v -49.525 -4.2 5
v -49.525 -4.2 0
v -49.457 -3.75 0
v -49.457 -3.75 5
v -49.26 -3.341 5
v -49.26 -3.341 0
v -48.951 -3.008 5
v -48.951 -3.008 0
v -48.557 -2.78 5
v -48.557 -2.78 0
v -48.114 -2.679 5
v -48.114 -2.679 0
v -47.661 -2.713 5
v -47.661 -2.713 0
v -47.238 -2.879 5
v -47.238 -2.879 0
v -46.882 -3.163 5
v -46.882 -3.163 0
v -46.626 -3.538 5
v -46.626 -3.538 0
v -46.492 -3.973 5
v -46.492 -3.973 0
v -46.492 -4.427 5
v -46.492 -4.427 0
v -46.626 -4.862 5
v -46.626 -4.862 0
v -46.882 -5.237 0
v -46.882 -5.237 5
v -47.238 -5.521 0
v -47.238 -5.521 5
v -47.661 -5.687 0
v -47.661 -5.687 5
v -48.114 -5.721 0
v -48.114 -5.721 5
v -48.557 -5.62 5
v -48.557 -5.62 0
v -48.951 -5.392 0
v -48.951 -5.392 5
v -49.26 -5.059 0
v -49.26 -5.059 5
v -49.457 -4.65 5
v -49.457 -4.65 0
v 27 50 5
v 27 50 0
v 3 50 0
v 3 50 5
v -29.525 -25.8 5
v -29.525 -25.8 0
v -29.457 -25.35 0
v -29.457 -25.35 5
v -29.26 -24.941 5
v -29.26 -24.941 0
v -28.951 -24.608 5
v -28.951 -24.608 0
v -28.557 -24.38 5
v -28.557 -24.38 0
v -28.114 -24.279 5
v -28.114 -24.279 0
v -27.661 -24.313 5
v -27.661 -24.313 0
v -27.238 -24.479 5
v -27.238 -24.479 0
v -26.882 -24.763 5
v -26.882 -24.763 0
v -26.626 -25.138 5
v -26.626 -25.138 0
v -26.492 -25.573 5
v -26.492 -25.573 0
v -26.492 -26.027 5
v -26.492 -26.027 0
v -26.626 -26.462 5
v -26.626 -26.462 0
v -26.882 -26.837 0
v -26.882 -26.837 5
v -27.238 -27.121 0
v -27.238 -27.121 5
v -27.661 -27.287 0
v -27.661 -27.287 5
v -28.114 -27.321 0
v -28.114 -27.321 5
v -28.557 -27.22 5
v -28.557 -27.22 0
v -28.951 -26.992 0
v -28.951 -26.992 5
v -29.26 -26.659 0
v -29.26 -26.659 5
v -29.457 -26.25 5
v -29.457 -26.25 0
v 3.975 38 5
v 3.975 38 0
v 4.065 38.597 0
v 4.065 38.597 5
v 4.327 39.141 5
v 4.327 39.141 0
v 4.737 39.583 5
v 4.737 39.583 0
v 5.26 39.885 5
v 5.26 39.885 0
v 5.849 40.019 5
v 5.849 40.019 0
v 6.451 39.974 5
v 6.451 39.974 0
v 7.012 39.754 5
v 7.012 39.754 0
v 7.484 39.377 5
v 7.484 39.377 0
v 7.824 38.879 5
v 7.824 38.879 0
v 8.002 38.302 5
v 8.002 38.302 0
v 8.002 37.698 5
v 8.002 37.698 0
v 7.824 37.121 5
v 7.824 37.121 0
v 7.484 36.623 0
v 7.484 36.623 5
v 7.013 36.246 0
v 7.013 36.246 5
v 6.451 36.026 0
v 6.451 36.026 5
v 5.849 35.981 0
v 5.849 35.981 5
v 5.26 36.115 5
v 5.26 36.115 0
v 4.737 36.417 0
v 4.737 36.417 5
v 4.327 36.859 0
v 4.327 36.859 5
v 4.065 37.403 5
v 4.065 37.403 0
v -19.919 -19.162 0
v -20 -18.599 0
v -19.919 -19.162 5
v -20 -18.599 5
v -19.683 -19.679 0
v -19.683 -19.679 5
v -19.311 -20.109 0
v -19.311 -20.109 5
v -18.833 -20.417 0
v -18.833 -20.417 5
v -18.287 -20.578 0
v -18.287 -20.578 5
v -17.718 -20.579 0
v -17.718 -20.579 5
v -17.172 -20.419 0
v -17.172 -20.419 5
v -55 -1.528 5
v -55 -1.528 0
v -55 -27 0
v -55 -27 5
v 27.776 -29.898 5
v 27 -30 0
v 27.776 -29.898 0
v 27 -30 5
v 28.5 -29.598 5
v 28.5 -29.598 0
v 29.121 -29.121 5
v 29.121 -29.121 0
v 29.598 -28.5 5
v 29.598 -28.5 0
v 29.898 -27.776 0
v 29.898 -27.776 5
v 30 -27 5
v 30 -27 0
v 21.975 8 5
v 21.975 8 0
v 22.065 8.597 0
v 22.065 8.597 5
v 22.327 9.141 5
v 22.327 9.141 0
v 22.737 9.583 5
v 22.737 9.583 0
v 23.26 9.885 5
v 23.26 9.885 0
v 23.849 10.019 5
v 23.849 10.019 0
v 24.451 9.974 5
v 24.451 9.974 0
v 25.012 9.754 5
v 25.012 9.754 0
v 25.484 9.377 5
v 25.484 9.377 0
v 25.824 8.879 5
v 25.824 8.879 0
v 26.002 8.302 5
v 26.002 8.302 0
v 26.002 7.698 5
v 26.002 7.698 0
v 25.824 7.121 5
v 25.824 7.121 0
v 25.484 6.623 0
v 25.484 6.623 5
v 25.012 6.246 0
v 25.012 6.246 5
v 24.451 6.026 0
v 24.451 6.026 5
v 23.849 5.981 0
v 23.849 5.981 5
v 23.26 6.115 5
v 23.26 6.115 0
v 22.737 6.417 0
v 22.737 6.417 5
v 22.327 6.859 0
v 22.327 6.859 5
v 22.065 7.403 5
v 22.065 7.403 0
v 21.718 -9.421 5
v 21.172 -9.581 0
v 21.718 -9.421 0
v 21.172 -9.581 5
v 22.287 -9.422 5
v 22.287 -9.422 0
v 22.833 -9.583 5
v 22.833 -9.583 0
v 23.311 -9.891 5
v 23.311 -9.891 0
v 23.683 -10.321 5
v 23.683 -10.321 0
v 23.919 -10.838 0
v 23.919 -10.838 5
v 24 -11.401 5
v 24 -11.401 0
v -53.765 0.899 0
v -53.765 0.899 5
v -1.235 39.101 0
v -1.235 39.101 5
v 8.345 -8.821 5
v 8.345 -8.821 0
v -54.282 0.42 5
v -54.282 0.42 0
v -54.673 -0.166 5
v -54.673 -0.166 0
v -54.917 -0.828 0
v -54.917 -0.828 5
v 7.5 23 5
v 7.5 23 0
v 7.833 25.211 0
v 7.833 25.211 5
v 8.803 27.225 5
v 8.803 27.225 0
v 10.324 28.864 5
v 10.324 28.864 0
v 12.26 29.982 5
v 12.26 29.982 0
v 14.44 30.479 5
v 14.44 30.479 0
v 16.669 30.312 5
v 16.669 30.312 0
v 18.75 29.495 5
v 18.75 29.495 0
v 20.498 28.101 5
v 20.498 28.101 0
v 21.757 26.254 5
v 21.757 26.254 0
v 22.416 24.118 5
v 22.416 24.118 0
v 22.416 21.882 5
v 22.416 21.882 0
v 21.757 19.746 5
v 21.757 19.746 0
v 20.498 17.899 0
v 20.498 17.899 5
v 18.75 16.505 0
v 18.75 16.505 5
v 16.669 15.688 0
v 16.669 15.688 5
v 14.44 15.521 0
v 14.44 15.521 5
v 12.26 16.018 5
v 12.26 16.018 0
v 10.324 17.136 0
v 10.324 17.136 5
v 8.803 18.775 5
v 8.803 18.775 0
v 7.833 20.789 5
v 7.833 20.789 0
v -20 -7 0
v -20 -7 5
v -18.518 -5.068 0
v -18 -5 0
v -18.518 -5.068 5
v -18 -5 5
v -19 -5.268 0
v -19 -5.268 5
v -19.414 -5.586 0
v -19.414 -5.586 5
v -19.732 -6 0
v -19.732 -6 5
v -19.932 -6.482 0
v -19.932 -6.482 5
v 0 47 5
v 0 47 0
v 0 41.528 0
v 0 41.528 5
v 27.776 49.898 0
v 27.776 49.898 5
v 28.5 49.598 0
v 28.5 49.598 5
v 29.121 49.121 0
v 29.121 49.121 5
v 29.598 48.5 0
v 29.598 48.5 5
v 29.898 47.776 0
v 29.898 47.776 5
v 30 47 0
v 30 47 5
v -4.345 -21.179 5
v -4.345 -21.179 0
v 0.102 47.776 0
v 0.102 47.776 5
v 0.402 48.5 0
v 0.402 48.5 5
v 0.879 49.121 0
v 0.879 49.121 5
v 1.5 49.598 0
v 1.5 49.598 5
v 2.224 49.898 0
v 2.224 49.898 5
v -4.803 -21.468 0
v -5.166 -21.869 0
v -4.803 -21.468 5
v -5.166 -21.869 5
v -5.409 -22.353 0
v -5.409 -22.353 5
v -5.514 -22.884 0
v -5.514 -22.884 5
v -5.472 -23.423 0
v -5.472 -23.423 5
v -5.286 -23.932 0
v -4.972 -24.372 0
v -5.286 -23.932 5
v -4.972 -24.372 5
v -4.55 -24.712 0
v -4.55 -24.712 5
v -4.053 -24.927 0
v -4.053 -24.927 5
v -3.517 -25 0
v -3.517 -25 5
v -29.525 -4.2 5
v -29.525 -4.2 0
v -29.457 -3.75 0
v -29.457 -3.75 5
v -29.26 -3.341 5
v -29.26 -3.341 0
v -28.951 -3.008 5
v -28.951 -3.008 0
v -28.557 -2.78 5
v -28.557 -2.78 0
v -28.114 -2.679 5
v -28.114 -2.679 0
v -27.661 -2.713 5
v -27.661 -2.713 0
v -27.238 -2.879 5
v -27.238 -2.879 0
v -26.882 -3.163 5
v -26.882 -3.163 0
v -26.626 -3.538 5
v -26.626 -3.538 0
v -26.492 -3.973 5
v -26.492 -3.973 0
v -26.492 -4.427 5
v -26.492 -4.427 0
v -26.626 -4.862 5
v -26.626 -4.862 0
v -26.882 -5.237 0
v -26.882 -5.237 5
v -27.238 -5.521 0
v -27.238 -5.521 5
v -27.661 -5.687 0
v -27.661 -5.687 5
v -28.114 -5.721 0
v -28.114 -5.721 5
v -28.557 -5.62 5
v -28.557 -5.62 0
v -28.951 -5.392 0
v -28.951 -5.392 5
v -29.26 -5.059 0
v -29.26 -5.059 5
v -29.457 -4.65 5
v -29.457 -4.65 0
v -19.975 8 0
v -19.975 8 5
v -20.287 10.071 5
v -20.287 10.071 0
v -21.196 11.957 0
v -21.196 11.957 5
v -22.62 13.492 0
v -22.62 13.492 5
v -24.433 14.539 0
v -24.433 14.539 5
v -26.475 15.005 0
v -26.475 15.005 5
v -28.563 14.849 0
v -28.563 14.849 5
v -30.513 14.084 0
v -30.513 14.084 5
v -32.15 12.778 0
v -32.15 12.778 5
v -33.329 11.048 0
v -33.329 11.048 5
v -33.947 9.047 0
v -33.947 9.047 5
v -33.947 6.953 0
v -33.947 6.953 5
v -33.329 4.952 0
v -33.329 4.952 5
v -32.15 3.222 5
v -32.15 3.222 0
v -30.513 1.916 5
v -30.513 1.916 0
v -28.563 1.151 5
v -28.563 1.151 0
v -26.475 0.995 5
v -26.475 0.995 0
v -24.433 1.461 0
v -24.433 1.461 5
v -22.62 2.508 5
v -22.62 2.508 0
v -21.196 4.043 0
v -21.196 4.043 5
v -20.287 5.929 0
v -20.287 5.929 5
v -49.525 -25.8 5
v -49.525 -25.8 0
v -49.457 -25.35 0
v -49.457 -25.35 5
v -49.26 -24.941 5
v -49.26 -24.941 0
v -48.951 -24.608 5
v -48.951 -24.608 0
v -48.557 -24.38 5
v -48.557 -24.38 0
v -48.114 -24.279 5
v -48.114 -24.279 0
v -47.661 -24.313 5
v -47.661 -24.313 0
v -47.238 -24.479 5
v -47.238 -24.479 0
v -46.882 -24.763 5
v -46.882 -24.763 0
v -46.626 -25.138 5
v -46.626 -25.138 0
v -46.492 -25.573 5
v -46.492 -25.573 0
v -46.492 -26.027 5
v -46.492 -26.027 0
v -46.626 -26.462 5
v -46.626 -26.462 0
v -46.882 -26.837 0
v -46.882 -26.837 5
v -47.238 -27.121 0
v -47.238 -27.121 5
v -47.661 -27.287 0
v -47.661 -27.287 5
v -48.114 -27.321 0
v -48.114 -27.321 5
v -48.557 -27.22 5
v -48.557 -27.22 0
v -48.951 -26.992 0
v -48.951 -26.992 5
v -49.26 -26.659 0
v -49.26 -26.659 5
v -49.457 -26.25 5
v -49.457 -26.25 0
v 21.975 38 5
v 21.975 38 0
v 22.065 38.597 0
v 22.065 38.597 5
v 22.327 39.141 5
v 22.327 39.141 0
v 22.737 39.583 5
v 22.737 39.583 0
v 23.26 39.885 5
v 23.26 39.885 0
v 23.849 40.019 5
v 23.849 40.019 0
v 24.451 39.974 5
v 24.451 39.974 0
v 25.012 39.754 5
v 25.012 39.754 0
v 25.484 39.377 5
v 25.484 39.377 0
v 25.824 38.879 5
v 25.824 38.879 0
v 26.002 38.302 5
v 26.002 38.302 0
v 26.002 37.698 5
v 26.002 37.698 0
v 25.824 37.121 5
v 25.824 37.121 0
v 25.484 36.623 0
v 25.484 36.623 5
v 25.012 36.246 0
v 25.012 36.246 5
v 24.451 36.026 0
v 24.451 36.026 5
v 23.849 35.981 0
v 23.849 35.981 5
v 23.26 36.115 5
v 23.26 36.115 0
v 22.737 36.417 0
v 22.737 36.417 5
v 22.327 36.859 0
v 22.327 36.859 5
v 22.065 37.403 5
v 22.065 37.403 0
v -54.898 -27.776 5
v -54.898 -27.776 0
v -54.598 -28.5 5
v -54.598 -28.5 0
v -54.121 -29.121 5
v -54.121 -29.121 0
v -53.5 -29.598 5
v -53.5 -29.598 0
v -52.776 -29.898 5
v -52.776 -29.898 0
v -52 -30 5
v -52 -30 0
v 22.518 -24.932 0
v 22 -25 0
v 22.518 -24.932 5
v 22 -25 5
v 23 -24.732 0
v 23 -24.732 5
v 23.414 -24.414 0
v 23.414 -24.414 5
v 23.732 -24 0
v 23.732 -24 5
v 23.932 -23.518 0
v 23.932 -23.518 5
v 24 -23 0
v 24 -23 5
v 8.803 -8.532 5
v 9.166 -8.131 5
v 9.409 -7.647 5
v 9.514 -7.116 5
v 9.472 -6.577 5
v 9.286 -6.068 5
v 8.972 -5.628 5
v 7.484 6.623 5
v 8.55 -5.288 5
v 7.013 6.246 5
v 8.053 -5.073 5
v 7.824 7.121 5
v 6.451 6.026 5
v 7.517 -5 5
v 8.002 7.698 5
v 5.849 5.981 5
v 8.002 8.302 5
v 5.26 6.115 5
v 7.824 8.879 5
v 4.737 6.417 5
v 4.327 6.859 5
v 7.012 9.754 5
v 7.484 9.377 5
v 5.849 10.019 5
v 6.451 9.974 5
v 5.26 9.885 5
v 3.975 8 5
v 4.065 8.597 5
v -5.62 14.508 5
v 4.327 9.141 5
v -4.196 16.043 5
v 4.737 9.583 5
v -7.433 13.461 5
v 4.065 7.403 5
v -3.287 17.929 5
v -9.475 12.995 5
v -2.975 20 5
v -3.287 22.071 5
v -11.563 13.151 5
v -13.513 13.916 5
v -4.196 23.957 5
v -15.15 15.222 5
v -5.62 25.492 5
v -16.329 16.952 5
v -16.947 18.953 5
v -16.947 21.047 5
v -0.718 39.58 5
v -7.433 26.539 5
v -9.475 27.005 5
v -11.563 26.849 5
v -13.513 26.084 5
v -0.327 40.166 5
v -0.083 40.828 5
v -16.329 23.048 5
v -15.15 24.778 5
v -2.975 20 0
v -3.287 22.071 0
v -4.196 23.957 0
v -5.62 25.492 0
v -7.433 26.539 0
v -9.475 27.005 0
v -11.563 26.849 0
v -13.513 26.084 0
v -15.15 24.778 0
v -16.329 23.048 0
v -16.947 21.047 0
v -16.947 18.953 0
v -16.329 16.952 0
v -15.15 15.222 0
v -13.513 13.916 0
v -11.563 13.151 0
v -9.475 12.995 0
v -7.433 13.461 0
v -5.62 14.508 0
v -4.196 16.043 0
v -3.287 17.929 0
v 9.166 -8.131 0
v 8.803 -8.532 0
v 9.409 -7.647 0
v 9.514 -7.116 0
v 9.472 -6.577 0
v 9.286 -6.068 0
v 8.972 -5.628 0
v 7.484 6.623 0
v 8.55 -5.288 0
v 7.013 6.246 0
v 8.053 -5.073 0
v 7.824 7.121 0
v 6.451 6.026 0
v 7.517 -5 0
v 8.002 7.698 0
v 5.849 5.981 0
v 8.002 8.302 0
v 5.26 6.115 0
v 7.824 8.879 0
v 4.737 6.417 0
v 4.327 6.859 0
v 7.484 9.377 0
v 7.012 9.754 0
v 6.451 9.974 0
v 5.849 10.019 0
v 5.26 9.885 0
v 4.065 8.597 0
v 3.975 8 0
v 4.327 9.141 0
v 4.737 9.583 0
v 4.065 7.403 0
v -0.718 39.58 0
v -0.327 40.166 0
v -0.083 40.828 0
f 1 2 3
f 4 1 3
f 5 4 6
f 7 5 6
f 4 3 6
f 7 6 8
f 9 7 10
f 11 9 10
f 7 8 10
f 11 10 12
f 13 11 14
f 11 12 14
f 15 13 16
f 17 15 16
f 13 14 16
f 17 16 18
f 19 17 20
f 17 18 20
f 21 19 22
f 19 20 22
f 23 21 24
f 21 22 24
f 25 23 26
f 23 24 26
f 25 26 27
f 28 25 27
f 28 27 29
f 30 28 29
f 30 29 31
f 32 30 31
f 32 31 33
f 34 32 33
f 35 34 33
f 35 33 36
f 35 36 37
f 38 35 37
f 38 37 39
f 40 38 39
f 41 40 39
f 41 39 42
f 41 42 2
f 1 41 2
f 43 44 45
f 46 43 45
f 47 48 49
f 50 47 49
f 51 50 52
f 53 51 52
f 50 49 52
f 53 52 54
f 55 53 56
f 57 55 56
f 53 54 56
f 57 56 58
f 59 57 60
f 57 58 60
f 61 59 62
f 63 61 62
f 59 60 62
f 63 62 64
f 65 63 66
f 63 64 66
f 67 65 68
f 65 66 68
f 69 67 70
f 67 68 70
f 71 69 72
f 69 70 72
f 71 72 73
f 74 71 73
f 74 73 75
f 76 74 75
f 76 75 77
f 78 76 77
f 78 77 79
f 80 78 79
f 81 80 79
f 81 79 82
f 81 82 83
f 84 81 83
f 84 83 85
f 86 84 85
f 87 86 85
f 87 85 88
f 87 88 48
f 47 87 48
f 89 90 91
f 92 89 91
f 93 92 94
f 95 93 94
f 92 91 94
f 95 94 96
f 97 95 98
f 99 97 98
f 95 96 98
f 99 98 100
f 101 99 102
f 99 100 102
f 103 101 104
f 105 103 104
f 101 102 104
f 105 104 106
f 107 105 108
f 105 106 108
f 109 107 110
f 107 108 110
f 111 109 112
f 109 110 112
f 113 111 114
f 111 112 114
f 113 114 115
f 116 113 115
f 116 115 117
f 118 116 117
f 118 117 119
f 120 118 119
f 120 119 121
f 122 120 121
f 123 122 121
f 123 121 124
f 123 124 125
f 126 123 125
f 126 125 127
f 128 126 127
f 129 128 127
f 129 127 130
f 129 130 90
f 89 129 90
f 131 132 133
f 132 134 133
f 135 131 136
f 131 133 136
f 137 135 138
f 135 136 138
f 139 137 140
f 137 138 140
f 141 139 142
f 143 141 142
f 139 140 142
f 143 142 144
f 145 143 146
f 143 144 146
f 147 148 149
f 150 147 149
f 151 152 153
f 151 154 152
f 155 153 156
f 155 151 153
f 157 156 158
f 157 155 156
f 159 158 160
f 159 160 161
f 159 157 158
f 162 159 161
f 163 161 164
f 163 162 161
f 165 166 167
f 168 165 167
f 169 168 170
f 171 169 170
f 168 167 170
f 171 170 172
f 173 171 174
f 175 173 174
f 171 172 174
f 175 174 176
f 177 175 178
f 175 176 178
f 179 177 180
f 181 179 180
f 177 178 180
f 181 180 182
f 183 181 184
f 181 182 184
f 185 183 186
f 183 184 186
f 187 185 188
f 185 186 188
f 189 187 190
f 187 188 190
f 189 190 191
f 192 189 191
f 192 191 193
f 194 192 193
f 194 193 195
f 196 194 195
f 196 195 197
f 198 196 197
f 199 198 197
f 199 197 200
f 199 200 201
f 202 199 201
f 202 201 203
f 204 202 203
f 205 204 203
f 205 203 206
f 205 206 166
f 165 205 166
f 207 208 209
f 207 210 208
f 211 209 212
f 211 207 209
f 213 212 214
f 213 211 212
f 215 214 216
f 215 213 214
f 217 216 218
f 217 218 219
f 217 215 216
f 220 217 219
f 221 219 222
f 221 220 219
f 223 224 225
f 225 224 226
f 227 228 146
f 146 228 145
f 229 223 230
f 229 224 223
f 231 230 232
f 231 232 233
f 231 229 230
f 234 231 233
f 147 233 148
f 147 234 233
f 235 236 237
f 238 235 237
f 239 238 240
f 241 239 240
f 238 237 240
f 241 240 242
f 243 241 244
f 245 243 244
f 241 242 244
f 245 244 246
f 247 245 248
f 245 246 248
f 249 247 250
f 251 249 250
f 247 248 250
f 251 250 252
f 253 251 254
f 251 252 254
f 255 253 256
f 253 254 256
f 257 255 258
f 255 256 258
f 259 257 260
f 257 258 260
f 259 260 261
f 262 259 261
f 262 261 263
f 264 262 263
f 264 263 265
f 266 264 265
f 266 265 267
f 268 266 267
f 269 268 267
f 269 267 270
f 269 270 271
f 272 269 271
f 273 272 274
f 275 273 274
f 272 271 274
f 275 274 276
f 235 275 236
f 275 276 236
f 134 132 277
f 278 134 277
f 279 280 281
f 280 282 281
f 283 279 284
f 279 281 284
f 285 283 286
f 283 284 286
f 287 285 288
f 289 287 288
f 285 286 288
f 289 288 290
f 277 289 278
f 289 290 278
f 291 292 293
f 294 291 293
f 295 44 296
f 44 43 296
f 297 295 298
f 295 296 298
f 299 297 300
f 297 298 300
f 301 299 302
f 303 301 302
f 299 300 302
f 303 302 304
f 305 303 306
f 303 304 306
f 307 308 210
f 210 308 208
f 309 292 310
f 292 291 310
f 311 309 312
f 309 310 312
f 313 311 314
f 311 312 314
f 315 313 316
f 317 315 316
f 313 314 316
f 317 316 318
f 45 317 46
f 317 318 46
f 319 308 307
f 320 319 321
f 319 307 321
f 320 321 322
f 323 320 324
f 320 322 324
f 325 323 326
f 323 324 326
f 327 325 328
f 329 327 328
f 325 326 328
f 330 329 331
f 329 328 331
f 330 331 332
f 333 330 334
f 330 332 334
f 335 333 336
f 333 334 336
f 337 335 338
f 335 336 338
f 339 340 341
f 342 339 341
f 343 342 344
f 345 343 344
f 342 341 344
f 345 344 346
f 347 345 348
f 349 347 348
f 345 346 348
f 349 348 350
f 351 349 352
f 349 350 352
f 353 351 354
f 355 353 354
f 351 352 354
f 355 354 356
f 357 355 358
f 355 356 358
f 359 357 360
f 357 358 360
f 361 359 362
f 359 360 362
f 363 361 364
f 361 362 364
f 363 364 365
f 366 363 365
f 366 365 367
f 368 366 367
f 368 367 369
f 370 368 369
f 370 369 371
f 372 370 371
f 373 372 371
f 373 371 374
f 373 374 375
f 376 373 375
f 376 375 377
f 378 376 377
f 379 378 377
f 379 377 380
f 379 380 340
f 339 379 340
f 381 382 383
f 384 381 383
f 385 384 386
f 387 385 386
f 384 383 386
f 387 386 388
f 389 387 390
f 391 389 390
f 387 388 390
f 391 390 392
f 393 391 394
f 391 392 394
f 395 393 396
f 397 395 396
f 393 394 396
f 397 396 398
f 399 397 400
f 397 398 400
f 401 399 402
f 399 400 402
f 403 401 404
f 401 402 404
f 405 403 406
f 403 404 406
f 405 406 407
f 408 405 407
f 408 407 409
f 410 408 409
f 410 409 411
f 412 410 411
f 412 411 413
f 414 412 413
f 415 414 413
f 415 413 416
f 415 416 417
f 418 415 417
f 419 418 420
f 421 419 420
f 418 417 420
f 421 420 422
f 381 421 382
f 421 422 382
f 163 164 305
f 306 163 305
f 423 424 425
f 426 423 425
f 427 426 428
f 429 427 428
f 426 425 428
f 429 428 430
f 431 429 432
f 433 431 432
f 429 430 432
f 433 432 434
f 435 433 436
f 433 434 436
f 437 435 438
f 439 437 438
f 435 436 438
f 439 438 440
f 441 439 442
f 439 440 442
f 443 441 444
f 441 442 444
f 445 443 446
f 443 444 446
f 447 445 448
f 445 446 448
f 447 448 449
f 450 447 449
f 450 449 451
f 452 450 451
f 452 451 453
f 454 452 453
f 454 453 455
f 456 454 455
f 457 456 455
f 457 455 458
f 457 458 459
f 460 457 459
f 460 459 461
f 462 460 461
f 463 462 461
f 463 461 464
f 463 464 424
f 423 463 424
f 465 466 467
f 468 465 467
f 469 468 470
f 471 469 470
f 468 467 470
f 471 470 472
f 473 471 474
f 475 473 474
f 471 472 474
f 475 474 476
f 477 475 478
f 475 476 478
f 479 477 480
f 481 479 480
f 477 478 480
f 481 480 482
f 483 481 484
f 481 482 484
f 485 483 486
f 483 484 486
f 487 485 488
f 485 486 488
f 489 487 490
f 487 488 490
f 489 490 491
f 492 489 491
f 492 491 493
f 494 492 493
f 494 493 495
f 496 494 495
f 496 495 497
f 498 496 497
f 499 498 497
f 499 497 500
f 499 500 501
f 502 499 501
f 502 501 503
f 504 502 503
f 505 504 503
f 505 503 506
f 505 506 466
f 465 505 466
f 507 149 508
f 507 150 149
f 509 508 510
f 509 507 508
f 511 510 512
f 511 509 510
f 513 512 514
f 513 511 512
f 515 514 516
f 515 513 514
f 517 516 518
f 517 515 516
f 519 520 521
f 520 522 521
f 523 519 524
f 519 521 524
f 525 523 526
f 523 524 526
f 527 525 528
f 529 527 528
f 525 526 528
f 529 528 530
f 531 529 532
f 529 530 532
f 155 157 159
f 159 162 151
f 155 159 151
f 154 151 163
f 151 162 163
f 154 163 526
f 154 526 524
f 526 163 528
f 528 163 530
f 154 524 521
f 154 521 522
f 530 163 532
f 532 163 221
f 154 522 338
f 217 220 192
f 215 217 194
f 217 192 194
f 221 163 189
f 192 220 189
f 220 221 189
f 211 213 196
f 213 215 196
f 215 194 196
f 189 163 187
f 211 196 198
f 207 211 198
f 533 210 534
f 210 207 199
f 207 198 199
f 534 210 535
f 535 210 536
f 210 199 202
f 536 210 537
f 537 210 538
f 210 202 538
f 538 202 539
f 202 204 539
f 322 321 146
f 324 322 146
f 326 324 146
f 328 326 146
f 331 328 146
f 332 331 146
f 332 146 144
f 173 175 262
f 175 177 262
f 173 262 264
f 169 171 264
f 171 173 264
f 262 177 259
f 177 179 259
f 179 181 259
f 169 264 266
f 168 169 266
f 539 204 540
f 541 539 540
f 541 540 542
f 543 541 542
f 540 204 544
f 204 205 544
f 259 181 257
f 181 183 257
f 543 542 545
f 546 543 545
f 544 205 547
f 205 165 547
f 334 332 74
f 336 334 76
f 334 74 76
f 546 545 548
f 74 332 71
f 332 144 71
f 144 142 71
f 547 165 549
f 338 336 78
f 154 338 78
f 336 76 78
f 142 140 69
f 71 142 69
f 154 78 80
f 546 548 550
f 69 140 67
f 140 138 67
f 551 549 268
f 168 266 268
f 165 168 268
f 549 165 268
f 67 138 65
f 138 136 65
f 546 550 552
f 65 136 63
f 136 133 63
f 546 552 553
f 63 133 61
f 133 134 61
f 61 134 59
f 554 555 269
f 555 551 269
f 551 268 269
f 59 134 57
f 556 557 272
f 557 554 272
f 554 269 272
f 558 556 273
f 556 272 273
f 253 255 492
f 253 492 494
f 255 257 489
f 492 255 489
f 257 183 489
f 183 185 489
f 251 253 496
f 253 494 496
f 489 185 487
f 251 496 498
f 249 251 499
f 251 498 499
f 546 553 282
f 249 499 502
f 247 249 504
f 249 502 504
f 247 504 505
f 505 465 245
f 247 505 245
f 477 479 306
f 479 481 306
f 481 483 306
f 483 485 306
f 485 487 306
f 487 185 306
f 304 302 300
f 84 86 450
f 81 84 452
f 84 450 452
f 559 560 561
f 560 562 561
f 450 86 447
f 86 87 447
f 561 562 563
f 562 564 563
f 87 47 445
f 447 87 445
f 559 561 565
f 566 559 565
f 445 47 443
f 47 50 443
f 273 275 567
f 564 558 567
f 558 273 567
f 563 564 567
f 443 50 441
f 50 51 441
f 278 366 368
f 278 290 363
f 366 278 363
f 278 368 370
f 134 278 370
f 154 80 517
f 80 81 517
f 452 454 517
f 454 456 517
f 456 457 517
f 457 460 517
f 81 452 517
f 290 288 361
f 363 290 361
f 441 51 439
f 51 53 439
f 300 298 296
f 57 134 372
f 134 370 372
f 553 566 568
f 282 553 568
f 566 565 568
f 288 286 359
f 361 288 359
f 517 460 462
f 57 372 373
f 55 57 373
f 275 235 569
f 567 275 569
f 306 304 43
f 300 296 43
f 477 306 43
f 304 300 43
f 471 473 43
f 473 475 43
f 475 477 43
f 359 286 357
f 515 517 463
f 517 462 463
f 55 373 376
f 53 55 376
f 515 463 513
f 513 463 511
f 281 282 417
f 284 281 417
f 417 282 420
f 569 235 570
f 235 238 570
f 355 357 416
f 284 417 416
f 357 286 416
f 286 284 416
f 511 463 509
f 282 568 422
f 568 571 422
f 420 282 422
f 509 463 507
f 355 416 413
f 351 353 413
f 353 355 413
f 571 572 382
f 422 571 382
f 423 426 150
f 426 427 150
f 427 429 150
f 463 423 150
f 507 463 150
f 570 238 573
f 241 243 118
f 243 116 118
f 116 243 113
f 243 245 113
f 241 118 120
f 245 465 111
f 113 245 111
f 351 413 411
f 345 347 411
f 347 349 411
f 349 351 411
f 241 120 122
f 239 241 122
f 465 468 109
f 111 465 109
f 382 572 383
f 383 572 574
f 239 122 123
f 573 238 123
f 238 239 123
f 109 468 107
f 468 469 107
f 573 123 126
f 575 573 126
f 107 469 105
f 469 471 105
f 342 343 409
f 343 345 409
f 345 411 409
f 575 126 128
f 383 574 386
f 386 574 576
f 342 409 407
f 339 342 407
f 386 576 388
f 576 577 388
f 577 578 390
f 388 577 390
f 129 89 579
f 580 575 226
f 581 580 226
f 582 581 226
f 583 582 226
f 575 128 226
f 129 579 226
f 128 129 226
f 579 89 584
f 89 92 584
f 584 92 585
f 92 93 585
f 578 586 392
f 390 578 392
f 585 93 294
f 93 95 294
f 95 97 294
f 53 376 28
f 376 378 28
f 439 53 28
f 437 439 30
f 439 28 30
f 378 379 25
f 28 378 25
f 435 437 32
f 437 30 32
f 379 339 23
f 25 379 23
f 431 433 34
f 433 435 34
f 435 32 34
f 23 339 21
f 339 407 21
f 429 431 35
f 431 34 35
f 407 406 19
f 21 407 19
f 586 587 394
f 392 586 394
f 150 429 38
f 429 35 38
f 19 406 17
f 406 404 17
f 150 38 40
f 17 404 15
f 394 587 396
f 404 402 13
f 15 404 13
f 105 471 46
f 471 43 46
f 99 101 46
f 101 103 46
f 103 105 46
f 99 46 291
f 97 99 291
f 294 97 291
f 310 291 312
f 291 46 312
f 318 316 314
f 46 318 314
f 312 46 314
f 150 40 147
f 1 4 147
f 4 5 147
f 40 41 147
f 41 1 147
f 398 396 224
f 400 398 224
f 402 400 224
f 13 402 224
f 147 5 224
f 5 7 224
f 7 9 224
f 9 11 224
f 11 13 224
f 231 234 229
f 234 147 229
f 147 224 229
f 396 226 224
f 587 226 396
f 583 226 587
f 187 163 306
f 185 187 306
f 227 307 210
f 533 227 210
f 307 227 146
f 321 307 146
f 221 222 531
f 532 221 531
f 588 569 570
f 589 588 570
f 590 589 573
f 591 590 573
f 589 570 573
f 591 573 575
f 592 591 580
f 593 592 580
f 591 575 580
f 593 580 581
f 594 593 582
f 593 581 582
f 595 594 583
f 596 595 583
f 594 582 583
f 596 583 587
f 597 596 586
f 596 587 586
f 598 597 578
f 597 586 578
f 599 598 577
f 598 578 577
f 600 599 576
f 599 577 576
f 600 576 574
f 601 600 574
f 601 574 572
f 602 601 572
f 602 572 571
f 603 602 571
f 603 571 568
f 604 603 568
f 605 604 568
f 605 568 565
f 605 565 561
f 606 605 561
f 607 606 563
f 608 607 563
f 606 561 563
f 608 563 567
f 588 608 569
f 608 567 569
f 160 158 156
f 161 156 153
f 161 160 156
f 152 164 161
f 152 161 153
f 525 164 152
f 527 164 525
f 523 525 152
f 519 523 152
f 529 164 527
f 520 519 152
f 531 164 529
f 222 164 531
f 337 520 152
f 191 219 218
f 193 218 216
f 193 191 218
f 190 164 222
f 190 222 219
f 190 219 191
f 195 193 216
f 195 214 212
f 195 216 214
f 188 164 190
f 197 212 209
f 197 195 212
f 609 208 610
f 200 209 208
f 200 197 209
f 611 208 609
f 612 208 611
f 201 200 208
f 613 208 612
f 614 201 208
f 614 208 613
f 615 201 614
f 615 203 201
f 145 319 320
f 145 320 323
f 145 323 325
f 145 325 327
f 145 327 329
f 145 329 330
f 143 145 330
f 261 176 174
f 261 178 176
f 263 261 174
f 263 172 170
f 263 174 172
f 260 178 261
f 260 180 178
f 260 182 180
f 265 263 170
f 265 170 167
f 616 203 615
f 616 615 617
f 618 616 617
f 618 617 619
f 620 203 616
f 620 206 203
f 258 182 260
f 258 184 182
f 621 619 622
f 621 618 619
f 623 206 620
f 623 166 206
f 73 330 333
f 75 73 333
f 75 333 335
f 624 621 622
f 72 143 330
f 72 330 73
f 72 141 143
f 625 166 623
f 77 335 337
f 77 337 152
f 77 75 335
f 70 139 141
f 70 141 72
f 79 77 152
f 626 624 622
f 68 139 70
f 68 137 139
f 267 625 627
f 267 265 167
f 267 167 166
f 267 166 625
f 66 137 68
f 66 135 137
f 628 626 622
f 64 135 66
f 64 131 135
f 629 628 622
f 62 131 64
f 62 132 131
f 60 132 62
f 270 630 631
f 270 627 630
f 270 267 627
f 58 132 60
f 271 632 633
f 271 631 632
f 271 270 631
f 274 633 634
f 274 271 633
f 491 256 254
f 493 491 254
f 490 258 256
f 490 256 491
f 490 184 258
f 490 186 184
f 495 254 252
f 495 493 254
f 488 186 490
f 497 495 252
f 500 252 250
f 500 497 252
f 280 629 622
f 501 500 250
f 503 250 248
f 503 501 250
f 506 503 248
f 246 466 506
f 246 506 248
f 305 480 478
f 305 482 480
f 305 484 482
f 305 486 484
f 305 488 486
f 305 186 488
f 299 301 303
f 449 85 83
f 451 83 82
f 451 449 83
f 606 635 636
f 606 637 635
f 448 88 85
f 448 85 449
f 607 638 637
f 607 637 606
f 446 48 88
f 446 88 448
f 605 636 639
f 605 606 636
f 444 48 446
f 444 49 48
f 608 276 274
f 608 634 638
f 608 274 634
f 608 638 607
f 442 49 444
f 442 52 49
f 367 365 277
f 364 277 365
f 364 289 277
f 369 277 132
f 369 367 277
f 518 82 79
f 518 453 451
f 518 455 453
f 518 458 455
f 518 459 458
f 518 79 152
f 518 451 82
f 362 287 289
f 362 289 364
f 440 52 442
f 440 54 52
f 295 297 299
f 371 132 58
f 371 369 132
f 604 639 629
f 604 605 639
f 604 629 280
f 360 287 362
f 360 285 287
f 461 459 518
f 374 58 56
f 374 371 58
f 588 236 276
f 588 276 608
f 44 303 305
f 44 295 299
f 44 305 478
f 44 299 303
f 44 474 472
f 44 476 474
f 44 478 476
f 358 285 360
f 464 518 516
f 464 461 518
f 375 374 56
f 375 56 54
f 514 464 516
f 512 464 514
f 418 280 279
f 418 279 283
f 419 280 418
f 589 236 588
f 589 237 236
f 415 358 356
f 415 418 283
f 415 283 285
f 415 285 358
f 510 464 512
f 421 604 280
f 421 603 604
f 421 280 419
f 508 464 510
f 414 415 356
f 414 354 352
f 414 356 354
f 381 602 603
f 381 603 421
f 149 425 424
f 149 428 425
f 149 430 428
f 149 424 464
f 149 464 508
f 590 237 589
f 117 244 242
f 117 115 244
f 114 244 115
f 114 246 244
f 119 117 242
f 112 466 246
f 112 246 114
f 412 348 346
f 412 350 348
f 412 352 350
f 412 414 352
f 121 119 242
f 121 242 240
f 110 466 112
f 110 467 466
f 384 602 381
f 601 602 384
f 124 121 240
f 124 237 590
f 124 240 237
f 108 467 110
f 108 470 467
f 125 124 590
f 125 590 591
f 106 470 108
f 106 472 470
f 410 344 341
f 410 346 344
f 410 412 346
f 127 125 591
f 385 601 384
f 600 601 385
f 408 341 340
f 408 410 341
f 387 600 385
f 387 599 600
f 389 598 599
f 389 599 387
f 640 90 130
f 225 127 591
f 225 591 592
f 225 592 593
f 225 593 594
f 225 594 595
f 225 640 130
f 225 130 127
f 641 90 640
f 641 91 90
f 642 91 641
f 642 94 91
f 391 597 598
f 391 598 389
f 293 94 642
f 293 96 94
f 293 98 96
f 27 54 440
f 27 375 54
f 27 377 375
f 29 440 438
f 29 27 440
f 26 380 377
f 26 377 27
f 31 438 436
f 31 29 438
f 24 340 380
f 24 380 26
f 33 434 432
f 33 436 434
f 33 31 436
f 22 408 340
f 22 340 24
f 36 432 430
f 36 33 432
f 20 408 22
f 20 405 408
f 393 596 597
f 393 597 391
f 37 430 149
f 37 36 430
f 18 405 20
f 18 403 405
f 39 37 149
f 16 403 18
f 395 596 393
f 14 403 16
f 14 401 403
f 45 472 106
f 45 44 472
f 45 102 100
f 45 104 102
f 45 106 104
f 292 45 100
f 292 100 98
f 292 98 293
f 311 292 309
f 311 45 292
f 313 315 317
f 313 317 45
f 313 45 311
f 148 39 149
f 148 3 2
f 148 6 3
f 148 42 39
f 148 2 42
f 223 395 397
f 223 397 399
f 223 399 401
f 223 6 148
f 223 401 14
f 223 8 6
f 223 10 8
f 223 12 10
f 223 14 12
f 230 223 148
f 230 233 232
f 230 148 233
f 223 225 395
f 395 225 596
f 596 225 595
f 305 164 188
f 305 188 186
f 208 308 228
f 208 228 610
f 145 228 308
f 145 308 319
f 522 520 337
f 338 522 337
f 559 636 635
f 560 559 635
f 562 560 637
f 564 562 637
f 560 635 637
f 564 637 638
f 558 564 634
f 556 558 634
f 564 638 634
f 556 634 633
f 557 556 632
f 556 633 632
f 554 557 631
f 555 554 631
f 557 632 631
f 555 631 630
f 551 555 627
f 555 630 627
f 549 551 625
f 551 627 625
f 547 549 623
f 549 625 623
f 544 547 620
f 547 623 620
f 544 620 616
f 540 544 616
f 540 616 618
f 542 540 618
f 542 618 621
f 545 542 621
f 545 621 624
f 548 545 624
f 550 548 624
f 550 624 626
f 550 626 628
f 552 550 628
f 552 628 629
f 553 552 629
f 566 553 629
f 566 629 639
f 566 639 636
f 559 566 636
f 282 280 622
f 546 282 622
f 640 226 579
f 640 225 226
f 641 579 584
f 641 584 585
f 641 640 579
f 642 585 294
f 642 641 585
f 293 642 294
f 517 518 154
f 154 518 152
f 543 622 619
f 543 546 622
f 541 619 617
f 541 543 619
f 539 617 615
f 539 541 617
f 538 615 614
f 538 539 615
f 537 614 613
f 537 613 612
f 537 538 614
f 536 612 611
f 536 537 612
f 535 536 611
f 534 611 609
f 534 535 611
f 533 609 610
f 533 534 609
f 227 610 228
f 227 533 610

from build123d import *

# Parameters (mm, degrees)
EXTRUDE_1_DEPTH          = 5
EXTRUDE_2_DEPTH          = 5
CUT_EXTRUDE_1_DEPTH      = 5
CUT_EXTRUDE_2_REACH      = 7
SKETCH_5_R               = 1.524999999
SKETCH_6_R               = 2.025
CUT_EXTRUDE_3_DEPTH      = 1
CUT_EXTRUDE_3_DEPTH_BACK = 6
CUT_EXTRUDE_4_DEPTH      = 6
FILLET_4_R               = 2
SKETCH_8_R               = 7.5
CUT_EXTRUDE_5_DEPTH      = 5
EXTRUDE_3_DEPTH          = 5
SKETCH_10_R              = 7.025
CUT_EXTRUDE_6_DEPTH      = 5
FILLET_5_R               = 3


with BuildPart() as part:
    # 草图1 → 凸台-拉伸1 (new body)
    with BuildSketch(Plane.XY):
        Polygon((0, 0), (-55, 0), (-55, -30), (30, -30), (30, 50), (0, 50), align=None)
    extrude(amount=EXTRUDE_1_DEPTH)

    # 草图2 → 凸台-拉伸2 (add)
    with BuildSketch(Plane.XY.offset(5)):
        Polygon((0, 40), (-45, 0), (0, 0), align=None)
    extrude(amount=-EXTRUDE_2_DEPTH)

    # 草图4 → 切除-拉伸1 (cut)
    with BuildSketch(Plane.XY.offset(5)):
        Polygon((0, 33.310225234), (0, 0), (-37.474003388, 0), align=None)
    extrude(amount=-CUT_EXTRUDE_1_DEPTH, mode=Mode.SUBTRACT)

    # 草图5 → 切除-拉伸2 (cut, up to next)
    with BuildSketch(Plane(origin=(0, 0, 0), x_dir=(-1, 0, 0), z_dir=(0, 0, -1)), mode=Mode.PRIVATE) as cut_extrude_2_sk1:
        with Locations((48, -4.2)):
            Circle(SKETCH_5_R)
    cut_extrude_2_tool1 = extrude(cut_extrude_2_sk1.sketch, amount=-CUT_EXTRUDE_2_REACH, mode=Mode.PRIVATE) & part.part
    add(cut_extrude_2_tool1.solids().sort_by_distance((-48, -4.2, 0))[0], mode=Mode.SUBTRACT)
    # 草图5 → 切除-拉伸2 (cut, up to next)
    with BuildSketch(Plane(origin=(0, 0, 0), x_dir=(-1, 0, 0), z_dir=(0, 0, -1)), mode=Mode.PRIVATE) as cut_extrude_2_sk2:
        with Locations((48, -25.8)):
            Circle(SKETCH_5_R)
    cut_extrude_2_tool2 = extrude(cut_extrude_2_sk2.sketch, amount=-CUT_EXTRUDE_2_REACH, mode=Mode.PRIVATE) & part.part
    add(cut_extrude_2_tool2.solids().sort_by_distance((-48, -25.8, 0))[0], mode=Mode.SUBTRACT)
    # 草图5 → 切除-拉伸2 (cut, up to next)
    with BuildSketch(Plane(origin=(0, 0, 0), x_dir=(-1, 0, 0), z_dir=(0, 0, -1)), mode=Mode.PRIVATE) as cut_extrude_2_sk3:
        with Locations((28, -4.2)):
            Circle(SKETCH_5_R)
    cut_extrude_2_tool3 = extrude(cut_extrude_2_sk3.sketch, amount=-CUT_EXTRUDE_2_REACH, mode=Mode.PRIVATE) & part.part
    add(cut_extrude_2_tool3.solids().sort_by_distance((-28, -4.2, 0))[0], mode=Mode.SUBTRACT)
    # 草图5 → 切除-拉伸2 (cut, up to next)
    with BuildSketch(Plane(origin=(0, 0, 0), x_dir=(-1, 0, 0), z_dir=(0, 0, -1)), mode=Mode.PRIVATE) as cut_extrude_2_sk4:
        with Locations((28, -25.8)):
            Circle(SKETCH_5_R)
    cut_extrude_2_tool4 = extrude(cut_extrude_2_sk4.sketch, amount=-CUT_EXTRUDE_2_REACH, mode=Mode.PRIVATE) & part.part
    add(cut_extrude_2_tool4.solids().sort_by_distance((-28, -25.8, 0))[0], mode=Mode.SUBTRACT)

    # 草图6 → 切除-拉伸3 (cut, two sides)
    with BuildSketch(Plane(origin=(0, 0, 0), x_dir=(-1, 0, 0), z_dir=(0, 0, -1))) as cut_extrude_3_sk:
        with Locations((-6, 38)):
            Circle(SKETCH_6_R)
        with Locations((-24, 38)):
            Circle(SKETCH_6_R)
        with Locations((-24, 8)):
            Circle(SKETCH_6_R)
        with Locations((-6, 8)):
            Circle(SKETCH_6_R)
    extrude(amount=CUT_EXTRUDE_3_DEPTH, mode=Mode.SUBTRACT)
    extrude(cut_extrude_3_sk.sketch, amount=-CUT_EXTRUDE_3_DEPTH_BACK, mode=Mode.SUBTRACT)

    # 草图7 → 切除-拉伸4 (cut, through all)
    with BuildSketch(Plane(origin=(0, 0, 0), x_dir=(-1, 0, 0), z_dir=(0, 0, -1))):
        Polygon((12.750172416, -25), (-24, -8.295376175), (-24, -25), align=None)
        Polygon((20, -5), (-16.750172416, -5), (20, -21.704623825), align=None)
    extrude(amount=-CUT_EXTRUDE_4_DEPTH, mode=Mode.SUBTRACT)

    # 圆角4
    fillet_4_edges = [part.edges().sort_by_distance(p)[0] for p in [
        (16.750172416, -5, 2.5),
        (-20, -5, 2.5),
        (-20, -21.704623825, 2.5),
        (24, -8.295376175, 2.5),
        (-12.750172416, -25, 2.5),
        (24, -25, 2.5),
    ]]
    fillet(fillet_4_edges, radius=FILLET_4_R)

    # 草图8 → 切除-拉伸5 (cut)
    with BuildSketch(Plane(origin=(0, 0, 0), x_dir=(-1, 0, 0), z_dir=(0, 0, -1))):
        with Locations((-15, 23)):
            Circle(SKETCH_8_R)
    extrude(amount=-CUT_EXTRUDE_5_DEPTH, mode=Mode.SUBTRACT)

    # 草图9 → 凸台-拉伸3 (add)
    with BuildSketch(Plane.XY.offset(5)):
        Polygon((-55, 0), (0, 40), (0, 0), align=None)
    extrude(amount=-EXTRUDE_3_DEPTH)

    # 草图10 → 切除-拉伸6 (cut)
    with BuildSketch(Plane.XY.offset(5)):
        with Locations((-27, 8)):
            Circle(SKETCH_10_R)
        with Locations((-10, 20)):
            Circle(SKETCH_10_R)
    extrude(amount=-CUT_EXTRUDE_6_DEPTH, mode=Mode.SUBTRACT)

    # 圆角5
    fillet_5_edges = [part.edges().sort_by_distance(p)[0] for p in [
        (0, 50, 2.5),
        (30, 50, 2.5),
        (30, -30, 2.5),
        (-55, -30, 2.5),
        (-55, 0, 2.5),
        (0, 40, 2.5),
    ]]
    fillet(fillet_5_edges, radius=FILLET_5_R)


solid = part.part
